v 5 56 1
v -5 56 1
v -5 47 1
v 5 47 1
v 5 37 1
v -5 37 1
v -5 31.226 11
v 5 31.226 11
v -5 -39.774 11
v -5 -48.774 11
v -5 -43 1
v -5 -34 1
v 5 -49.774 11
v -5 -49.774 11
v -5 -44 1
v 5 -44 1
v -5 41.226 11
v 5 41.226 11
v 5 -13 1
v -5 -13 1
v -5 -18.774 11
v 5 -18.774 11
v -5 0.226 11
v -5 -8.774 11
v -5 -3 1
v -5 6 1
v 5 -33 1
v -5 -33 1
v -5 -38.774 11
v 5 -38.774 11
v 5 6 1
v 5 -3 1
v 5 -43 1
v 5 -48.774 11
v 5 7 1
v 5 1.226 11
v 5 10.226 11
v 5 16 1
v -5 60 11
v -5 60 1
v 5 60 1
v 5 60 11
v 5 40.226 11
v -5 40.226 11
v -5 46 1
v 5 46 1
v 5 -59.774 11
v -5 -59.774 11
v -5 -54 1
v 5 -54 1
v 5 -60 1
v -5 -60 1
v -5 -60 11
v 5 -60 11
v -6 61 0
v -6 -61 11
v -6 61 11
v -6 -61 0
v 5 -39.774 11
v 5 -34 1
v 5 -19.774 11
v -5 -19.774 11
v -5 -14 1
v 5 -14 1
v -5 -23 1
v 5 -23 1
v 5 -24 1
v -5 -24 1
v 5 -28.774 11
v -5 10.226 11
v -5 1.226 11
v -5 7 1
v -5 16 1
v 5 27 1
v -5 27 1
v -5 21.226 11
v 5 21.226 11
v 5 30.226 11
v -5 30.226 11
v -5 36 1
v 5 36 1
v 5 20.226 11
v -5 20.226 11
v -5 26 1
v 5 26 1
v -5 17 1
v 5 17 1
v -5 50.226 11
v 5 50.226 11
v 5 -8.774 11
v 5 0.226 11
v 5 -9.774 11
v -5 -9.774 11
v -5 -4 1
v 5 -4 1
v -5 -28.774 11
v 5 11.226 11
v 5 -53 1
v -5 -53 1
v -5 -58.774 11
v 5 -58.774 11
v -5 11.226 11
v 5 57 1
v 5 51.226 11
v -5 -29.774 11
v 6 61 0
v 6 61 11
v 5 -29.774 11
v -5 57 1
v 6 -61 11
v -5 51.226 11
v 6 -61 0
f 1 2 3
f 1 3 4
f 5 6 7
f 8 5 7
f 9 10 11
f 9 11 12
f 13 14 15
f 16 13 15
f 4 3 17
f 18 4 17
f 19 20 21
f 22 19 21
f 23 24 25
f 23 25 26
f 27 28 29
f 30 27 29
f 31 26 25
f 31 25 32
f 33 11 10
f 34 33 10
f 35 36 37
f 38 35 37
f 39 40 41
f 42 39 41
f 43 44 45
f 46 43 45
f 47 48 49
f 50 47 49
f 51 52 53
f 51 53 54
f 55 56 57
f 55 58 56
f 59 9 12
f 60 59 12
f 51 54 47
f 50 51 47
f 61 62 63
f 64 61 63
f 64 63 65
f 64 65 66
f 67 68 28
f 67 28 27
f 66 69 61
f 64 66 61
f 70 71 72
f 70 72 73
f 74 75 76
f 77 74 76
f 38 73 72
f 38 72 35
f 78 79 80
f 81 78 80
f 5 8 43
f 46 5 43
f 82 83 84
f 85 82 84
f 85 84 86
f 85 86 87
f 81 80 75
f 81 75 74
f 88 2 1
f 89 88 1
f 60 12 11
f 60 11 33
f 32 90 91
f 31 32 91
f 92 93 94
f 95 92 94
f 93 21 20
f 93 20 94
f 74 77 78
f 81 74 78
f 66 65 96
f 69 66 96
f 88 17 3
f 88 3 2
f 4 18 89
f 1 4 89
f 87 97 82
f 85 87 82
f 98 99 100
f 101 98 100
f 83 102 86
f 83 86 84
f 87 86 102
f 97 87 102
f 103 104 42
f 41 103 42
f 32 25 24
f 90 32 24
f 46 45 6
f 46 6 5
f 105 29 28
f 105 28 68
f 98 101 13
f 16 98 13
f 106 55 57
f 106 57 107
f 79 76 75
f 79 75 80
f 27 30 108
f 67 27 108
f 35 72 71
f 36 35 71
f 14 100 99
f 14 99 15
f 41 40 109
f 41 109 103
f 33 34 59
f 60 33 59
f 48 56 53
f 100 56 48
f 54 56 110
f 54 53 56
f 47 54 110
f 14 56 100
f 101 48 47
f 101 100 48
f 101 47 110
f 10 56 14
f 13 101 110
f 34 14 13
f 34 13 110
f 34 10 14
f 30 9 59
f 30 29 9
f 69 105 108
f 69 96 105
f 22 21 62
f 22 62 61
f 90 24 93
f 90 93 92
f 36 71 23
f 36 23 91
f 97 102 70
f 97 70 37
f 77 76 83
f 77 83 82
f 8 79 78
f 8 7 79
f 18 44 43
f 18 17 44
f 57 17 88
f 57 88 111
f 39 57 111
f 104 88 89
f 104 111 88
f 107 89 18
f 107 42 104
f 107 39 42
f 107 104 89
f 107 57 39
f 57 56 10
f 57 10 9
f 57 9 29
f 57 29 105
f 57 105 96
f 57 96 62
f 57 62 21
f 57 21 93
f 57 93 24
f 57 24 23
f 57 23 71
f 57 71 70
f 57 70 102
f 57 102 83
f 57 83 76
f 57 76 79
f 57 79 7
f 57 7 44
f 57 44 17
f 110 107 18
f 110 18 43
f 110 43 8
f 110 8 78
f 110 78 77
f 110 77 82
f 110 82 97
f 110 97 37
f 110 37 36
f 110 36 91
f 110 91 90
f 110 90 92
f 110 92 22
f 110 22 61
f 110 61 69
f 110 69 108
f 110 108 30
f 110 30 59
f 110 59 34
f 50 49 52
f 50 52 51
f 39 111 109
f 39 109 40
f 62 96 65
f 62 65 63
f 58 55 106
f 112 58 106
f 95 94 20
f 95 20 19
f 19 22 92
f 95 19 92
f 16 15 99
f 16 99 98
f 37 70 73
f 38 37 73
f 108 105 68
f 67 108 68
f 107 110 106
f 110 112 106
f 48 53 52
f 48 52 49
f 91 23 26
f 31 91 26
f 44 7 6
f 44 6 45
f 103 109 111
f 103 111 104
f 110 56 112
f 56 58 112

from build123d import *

# Parameters (mm, degrees)
ESBO_O1_W                = 12
ESBO_O1_H                = 122
RESSALTO_EXTRUS_O1_DEPTH = 1
ESBO_O2_W                = 12
ESBO_O2_H                = 122
ESBO_O2_W_2              = 10
ESBO_O2_H_2              = 120
RESSALTO_EXTRUS_O2_DEPTH = 10
ESBO_O3_W                = 10
ESBO_O3_H                = 1
RESSALTO_EXTRUS_O3_DEPTH = 11.547005384
PADR_O_START             = -5
PADR_O_LINEAR1_DEPTH     = 10


# Read off the part's stored shape, not the designer's step: Padrão linear1
with BuildPart() as part:
    # Esboço1 → Ressalto-extrusão1 (new body)
    with BuildSketch(Plane.XY):
        Rectangle(ESBO_O1_W, ESBO_O1_H)
    extrude(amount=RESSALTO_EXTRUS_O1_DEPTH)

    # Esboço2 → Ressalto-extrusão2 (add)
    with BuildSketch(Plane.XY.offset(1)):
        Rectangle(ESBO_O2_W, ESBO_O2_H)
        Rectangle(ESBO_O2_W_2, ESBO_O2_H_2, mode=Mode.SUBTRACT)
    extrude(amount=RESSALTO_EXTRUS_O2_DEPTH)

    # Esboço3 → Ressalto-extrusão3 (add, along a direction that is not the sketch's normal)
    with BuildSketch(Plane.XY.offset(1)):
        with Locations((0, 56.5)):
            Rectangle(ESBO_O3_W, ESBO_O3_H)
    extrude(amount=RESSALTO_EXTRUS_O3_DEPTH, dir=(0, -0.4999999999999981, 0.8660254037844398))

    # Padrão linear1 outline → Padrão linear1 (add)
    with BuildSketch(Plane.YZ.offset(PADR_O_START)):
        Polygon((-58.773502692, 11), (-59.773502692, 11), (-54, 1), (-53, 1), align=None)
        Polygon((-48.773502692, 11), (-49.773502692, 11), (-44, 1), (-43, 1), align=None)
        Polygon((-38.773502692, 11), (-39.773502692, 11), (-34, 1), (-33, 1), align=None)
        Polygon((-28.773502692, 11), (-29.773502692, 11), (-24, 1), (-23, 1), align=None)
        Polygon((-18.773502692, 11), (-19.773502692, 11), (-14, 1), (-13, 1), align=None)
        Polygon((-8.773502692, 11), (-9.773502692, 11), (-4, 1), (-3, 1), align=None)
        Polygon((1.226497308, 11), (0.226497308, 11), (6, 1), (7, 1), align=None)
        Polygon((11.226497308, 11), (10.226497308, 11), (16, 1), (17, 1), align=None)
        Polygon((21.226497308, 11), (20.226497308, 11), (26, 1), (27, 1), align=None)
        Polygon((31.226497308, 11), (30.226497308, 11), (36, 1), (37, 1), align=None)
        Polygon((41.226497308, 11), (40.226497308, 11), (46, 1), (47, 1), align=None)
    extrude(amount=PADR_O_LINEAR1_DEPTH)


solid = part.part
